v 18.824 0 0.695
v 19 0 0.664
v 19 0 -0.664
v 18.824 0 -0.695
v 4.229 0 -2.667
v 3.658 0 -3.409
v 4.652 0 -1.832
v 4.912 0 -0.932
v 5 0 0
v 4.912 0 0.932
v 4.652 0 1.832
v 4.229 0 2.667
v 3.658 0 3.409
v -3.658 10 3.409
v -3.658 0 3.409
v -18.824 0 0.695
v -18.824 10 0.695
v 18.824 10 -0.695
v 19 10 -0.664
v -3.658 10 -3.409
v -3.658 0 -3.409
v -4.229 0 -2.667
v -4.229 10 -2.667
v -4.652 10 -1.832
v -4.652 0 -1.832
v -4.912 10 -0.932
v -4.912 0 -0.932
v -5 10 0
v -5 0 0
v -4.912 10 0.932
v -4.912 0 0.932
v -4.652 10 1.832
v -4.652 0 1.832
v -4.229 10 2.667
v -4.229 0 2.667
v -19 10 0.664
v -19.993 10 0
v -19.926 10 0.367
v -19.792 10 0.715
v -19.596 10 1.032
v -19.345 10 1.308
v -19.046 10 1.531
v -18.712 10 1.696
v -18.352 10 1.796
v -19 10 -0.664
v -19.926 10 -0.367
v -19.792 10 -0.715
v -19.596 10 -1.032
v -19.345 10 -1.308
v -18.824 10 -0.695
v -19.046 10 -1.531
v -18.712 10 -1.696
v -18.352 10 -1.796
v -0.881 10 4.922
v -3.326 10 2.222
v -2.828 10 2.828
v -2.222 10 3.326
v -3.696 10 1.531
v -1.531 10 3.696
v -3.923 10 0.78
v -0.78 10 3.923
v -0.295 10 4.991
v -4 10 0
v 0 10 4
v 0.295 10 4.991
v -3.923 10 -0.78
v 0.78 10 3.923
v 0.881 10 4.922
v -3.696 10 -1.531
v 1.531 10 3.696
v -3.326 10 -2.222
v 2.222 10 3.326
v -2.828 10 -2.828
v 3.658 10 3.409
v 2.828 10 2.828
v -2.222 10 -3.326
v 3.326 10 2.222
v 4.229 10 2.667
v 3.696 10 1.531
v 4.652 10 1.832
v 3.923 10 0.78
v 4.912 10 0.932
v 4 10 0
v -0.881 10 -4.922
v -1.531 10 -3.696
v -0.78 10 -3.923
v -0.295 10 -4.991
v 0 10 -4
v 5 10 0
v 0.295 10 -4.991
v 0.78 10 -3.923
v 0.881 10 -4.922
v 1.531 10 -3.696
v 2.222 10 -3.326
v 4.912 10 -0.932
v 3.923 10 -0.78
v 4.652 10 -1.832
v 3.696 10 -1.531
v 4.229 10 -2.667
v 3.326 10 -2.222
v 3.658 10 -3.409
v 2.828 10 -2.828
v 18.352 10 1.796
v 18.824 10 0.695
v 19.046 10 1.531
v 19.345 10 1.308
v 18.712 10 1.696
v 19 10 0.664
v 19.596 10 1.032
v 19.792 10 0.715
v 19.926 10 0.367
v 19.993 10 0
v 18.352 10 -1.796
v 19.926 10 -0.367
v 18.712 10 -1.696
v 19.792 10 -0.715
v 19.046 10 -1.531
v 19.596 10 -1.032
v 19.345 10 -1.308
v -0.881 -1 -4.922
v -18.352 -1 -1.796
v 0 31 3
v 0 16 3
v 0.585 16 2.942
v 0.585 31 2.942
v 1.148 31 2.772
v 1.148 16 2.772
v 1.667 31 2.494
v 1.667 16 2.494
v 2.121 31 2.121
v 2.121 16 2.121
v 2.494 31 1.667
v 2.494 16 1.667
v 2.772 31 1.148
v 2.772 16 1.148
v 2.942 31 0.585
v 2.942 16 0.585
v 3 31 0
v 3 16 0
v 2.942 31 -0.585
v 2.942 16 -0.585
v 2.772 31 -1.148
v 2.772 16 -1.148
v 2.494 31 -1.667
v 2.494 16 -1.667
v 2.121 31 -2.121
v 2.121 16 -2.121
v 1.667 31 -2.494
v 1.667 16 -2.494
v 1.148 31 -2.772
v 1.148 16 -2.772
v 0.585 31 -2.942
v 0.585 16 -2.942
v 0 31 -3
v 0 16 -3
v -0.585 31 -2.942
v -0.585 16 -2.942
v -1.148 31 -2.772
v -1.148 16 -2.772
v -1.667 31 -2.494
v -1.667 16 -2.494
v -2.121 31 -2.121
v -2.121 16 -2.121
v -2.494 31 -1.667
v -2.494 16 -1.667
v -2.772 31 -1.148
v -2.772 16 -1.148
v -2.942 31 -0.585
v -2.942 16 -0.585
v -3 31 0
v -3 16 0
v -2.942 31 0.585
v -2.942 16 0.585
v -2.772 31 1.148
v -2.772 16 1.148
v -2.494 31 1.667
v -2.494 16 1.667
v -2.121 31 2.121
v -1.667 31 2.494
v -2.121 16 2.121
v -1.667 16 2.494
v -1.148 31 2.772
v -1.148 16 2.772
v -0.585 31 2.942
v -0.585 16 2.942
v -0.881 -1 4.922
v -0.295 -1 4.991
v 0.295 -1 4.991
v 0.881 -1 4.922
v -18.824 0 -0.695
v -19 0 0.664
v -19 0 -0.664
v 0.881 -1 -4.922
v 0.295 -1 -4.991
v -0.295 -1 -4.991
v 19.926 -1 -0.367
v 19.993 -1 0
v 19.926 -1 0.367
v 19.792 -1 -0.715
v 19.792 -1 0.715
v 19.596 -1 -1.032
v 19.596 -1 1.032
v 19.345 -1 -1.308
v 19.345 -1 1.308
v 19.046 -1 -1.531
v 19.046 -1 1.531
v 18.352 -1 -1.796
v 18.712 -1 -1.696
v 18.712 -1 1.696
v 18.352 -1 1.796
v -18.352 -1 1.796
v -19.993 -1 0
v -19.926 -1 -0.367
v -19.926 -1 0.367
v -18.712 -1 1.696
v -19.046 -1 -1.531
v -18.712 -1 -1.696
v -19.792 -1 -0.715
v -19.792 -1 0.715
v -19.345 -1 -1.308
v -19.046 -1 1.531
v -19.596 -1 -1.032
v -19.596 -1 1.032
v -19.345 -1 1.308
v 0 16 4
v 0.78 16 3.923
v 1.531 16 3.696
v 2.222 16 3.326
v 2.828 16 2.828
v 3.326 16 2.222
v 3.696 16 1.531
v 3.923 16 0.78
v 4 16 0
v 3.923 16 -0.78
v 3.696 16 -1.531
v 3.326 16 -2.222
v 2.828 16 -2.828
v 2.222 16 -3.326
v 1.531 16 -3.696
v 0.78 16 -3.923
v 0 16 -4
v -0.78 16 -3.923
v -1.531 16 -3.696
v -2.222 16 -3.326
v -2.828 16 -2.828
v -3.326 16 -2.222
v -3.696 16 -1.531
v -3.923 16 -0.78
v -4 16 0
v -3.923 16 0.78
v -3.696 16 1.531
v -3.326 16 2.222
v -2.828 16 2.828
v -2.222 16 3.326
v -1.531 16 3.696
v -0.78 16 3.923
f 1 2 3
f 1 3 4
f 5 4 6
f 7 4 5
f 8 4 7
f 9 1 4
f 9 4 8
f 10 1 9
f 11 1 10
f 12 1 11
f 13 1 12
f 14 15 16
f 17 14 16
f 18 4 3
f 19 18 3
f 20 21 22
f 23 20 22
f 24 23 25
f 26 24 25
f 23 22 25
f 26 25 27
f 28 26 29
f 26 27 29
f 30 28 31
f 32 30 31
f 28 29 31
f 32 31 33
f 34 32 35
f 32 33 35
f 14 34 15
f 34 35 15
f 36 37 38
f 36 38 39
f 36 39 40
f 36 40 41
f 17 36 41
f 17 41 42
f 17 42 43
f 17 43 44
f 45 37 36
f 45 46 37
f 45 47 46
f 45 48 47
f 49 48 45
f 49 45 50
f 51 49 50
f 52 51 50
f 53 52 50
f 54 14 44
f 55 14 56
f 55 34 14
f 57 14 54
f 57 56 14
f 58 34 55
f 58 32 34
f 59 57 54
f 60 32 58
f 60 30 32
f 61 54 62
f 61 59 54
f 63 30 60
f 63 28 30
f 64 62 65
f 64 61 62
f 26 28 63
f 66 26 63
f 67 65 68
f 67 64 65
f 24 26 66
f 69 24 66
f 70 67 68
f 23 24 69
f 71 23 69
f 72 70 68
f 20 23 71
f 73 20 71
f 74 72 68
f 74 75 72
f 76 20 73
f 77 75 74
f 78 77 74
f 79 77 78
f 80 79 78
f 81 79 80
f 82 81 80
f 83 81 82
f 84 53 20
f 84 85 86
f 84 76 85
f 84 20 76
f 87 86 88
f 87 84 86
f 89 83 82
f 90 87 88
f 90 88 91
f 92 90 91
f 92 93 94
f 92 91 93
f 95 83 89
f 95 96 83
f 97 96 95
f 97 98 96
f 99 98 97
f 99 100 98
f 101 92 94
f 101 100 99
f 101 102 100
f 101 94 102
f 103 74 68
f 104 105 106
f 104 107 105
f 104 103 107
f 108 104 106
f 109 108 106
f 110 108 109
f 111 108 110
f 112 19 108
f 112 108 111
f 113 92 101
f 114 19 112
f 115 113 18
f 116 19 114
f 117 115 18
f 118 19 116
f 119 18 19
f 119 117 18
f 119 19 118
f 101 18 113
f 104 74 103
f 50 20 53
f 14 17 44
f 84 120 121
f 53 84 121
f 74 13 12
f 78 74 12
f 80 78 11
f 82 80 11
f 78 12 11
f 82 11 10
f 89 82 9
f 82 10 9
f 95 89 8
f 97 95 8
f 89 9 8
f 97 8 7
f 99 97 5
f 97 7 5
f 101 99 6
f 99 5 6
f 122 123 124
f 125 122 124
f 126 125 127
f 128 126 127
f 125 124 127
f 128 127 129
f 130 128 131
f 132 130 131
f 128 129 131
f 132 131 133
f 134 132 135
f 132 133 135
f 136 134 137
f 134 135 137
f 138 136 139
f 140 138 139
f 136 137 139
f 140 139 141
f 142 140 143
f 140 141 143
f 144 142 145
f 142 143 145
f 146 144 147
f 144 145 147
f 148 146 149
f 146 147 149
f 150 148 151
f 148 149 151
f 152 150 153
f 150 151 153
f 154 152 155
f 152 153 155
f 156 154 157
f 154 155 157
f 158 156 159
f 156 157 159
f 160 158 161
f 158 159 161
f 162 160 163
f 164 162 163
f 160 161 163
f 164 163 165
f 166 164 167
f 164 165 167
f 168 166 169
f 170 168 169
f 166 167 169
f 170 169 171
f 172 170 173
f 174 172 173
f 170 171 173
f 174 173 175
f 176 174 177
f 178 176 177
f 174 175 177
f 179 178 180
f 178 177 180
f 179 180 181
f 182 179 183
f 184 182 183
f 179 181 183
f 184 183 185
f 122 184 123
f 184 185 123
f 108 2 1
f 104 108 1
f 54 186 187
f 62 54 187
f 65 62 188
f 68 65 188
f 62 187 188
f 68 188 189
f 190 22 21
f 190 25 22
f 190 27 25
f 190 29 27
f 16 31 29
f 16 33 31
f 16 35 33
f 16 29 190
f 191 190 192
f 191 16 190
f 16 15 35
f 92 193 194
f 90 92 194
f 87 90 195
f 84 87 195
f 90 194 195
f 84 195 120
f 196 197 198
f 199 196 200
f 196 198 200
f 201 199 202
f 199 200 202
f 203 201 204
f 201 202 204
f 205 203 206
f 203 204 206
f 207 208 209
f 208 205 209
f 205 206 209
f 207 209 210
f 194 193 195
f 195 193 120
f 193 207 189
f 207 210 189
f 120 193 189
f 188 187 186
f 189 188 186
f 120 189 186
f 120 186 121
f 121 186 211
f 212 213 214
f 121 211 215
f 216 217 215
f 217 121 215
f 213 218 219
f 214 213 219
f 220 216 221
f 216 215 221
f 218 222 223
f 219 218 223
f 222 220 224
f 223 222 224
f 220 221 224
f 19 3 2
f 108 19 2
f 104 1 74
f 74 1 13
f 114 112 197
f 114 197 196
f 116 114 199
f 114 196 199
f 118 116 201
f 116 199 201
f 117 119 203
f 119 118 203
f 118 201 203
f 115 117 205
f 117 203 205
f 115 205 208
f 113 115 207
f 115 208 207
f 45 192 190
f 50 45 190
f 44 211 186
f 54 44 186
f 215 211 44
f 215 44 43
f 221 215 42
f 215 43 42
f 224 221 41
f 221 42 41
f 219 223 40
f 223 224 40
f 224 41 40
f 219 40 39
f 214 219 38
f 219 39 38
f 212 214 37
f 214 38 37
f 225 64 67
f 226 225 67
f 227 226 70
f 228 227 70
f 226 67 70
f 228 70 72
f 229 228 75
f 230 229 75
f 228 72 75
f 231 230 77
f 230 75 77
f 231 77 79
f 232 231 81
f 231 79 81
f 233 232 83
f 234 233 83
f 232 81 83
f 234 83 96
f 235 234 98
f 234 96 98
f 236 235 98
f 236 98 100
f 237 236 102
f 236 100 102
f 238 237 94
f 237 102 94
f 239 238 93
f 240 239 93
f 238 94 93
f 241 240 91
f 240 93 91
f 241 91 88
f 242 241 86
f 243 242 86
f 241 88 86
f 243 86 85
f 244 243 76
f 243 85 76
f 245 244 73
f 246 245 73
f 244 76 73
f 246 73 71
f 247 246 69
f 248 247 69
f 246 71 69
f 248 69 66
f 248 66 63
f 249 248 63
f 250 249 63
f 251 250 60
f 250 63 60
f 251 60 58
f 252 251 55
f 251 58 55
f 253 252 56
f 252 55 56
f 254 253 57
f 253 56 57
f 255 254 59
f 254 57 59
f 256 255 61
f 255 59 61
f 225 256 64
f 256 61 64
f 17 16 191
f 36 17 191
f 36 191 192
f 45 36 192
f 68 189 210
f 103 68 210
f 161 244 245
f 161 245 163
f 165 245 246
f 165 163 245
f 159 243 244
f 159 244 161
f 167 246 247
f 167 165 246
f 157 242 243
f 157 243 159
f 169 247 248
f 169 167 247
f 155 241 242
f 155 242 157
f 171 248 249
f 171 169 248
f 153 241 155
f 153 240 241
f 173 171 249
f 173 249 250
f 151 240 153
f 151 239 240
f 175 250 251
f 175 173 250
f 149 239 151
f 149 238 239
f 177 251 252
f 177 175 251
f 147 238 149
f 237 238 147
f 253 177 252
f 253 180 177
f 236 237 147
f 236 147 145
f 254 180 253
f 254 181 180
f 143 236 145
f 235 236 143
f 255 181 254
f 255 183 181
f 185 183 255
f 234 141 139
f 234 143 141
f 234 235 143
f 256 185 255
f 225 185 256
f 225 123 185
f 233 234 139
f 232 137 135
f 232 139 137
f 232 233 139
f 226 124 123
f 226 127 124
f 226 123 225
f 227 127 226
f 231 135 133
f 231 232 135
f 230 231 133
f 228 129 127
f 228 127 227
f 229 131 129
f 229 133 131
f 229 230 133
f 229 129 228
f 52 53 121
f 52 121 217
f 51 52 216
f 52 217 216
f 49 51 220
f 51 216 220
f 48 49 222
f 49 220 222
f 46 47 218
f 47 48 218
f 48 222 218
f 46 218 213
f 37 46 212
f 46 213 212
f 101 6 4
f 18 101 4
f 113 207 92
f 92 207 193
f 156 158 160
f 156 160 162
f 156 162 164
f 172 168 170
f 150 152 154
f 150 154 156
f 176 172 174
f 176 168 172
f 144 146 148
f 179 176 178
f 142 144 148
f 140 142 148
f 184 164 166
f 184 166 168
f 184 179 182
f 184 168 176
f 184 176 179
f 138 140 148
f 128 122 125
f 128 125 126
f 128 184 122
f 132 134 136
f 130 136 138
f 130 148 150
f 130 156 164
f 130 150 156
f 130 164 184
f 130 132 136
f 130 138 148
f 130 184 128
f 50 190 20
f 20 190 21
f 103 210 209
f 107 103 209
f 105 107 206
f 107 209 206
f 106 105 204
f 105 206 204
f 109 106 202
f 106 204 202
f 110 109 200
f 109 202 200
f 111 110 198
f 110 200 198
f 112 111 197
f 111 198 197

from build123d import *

# Parameters (mm, degrees)
BOSS_EXTRUDE1_DEPTH = 10
BOSS_EXTRUDE2_START = 1
BOSS_EXTRUDE2_DEPTH = 1
SKETCH3_R           = 4
BOSS_EXTRUDE3_DEPTH = 6
SKETCH4_R           = 3
BOSS_EXTRUDE4_DEPTH = 15
FILLET1_R           = 2


with BuildPart() as part:
    # Sketch1 → Boss-Extrude1 (new body)
    with BuildSketch(Plane(origin=(0, 0, 0), x_dir=(1, 0, 0), z_dir=(0, 1, 0))):
        with BuildLine():
            Line((-20.000157194, 1.500878546), (-20.000157194, -1.500878546))
            Line((-20.000157194, -1.500878546), (-0.880639137, -4.921836518))
            ThreePointArc((-0.880639137, -4.921836518), (0, -5), (0.880639137, -4.921836518))
            Line((0.880639137, -4.921836518), (20.000157194, -1.500878546))
            Line((20.000157194, -1.500878546), (20.000157194, 1.500878546))
            Line((20.000157194, 1.500878546), (0.880639137, 4.921836518))
            ThreePointArc((0.880639137, 4.921836518), (0, 5), (-0.880639137, 4.921836518))
            Line((-0.880639137, 4.921836518), (-20.000157194, 1.500878546))
        make_face()
        with BuildLine():
            Line((-19.000157194, -0.663922493), (-19.000157194, 0.663922493))
            Line((-19.000157194, 0.663922493), (-18.824029366, 0.695436148))
            Line((-18.824029366, 0.695436148), (-3.65761322, 3.409085733))
            ThreePointArc((-3.65761322, 3.409085733), (-5, 0), (-3.65761322, -3.409085733))
            Line((-3.65761322, -3.409085733), (-18.824029366, -0.695436148))
            Line((-18.824029366, -0.695436148), (-19.000157194, -0.663922493))
        make_face(mode=Mode.SUBTRACT)
        with BuildLine():
            Line((18.824029366, 0.695436148), (19.000157194, 0.663922493))
            Line((19.000157194, 0.663922493), (19.000157194, -0.663922493))
            Line((19.000157194, -0.663922493), (18.824029366, -0.695436148))
            Line((18.824029366, -0.695436148), (3.65761322, -3.409085733))
            ThreePointArc((3.65761322, -3.409085733), (5, 0), (3.65761322, 3.409085733))
            Line((3.65761322, 3.409085733), (18.824029366, 0.695436148))
        make_face(mode=Mode.SUBTRACT)
    extrude(amount=BOSS_EXTRUDE1_DEPTH)

    # Sketch2 → Boss-Extrude2 (add)
    with BuildSketch(Plane.XZ.offset(BOSS_EXTRUDE2_START)):
        with BuildLine():
            Line((-20.000157194, 1.500878546), (-0.880639137, 4.921836518))
            ThreePointArc((-0.880639137, 4.921836518), (0, 5), (0.880639137, 4.921836518))
            Line((0.880639137, 4.921836518), (20.000157194, 1.500878546))
            Line((20.000157194, 1.500878546), (20.000157194, -1.500878546))
            Line((20.000157194, -1.500878546), (0.880639137, -4.921836518))
            ThreePointArc((0.880639137, -4.921836518), (0, -5), (-0.880639137, -4.921836518))
            Line((-0.880639137, -4.921836518), (-20.000157194, -1.500878546))
            Line((-20.000157194, -1.500878546), (-20.000157194, 1.500878546))
        make_face()
    extrude(amount=-BOSS_EXTRUDE2_DEPTH)

    # Sketch3 → Boss-Extrude3 (add)
    with BuildSketch(Plane(origin=(0, 10, 0), x_dir=(1, 0, 0), z_dir=(0, 1, 0))):
        with Locations(Location((0, 0, 0), (0, 0, 270))):
            Circle(SKETCH3_R)
    extrude(amount=BOSS_EXTRUDE3_DEPTH)

    # Sketch4 → Boss-Extrude4 (add)
    with BuildSketch(Plane(origin=(0, 16, 0), x_dir=(1, 0, 0), z_dir=(0, 1, 0))):
        with Locations(Location((0, 0, 0), (0, 0, 270))):
            Circle(SKETCH4_R)
    extrude(amount=BOSS_EXTRUDE4_DEPTH)

    # Fillet1
    # the kernel refuses this fillet: 2 mm, written as the material it takes off along each edge
    with BuildSketch(Plane(origin=(20.000157194, -5.184780263, 1.500878546), x_dir=(-0.9843673036221247, 0, 0.17612782732920945), z_dir=(0, 1, 0)), Plane(origin=(20.000157194, -5.184780263, -1.500878546), x_dir=(0, 0, 1), z_dir=(0, 1, 0)), Plane(origin=(-20.000157194, 14.184780263, 1.500878546), x_dir=(0.9843673036221245, 0, 0.17612782732920956), z_dir=(0, -1, 0))) as fillet1_piece_1:
        with BuildLine():
            CenterArc((FILLET1_R * 0.836956052521, -FILLET1_R), FILLET1_R, 90, 79.855702636)
            Line((-FILLET1_R * 0.147411251101, -FILLET1_R * 0.823872172671), (0, 0))
            Line((0, 0), (FILLET1_R * 0.836956052521, 0))
        make_face()
    extrude(amount=19.369560525, mode=Mode.SUBTRACT)
    with BuildSketch(Plane(origin=(-20.000157194, -5.184780263, -1.500878546), x_dir=(0, 0, 1), z_dir=(0, 1, 0))) as fillet1_piece_2:
        with BuildLine():
            CenterArc((FILLET1_R * 0.836956052521, FILLET1_R), FILLET1_R, 190.144297364, 79.855702636)
            Line((-FILLET1_R * 0.147411251101, FILLET1_R * 0.823872172671), (0, 0))
            Line((0, 0), (FILLET1_R * 0.836956052521, 0))
        make_face()
    extrude(amount=19.369560525, mode=Mode.SUBTRACT)


solid = part.part
